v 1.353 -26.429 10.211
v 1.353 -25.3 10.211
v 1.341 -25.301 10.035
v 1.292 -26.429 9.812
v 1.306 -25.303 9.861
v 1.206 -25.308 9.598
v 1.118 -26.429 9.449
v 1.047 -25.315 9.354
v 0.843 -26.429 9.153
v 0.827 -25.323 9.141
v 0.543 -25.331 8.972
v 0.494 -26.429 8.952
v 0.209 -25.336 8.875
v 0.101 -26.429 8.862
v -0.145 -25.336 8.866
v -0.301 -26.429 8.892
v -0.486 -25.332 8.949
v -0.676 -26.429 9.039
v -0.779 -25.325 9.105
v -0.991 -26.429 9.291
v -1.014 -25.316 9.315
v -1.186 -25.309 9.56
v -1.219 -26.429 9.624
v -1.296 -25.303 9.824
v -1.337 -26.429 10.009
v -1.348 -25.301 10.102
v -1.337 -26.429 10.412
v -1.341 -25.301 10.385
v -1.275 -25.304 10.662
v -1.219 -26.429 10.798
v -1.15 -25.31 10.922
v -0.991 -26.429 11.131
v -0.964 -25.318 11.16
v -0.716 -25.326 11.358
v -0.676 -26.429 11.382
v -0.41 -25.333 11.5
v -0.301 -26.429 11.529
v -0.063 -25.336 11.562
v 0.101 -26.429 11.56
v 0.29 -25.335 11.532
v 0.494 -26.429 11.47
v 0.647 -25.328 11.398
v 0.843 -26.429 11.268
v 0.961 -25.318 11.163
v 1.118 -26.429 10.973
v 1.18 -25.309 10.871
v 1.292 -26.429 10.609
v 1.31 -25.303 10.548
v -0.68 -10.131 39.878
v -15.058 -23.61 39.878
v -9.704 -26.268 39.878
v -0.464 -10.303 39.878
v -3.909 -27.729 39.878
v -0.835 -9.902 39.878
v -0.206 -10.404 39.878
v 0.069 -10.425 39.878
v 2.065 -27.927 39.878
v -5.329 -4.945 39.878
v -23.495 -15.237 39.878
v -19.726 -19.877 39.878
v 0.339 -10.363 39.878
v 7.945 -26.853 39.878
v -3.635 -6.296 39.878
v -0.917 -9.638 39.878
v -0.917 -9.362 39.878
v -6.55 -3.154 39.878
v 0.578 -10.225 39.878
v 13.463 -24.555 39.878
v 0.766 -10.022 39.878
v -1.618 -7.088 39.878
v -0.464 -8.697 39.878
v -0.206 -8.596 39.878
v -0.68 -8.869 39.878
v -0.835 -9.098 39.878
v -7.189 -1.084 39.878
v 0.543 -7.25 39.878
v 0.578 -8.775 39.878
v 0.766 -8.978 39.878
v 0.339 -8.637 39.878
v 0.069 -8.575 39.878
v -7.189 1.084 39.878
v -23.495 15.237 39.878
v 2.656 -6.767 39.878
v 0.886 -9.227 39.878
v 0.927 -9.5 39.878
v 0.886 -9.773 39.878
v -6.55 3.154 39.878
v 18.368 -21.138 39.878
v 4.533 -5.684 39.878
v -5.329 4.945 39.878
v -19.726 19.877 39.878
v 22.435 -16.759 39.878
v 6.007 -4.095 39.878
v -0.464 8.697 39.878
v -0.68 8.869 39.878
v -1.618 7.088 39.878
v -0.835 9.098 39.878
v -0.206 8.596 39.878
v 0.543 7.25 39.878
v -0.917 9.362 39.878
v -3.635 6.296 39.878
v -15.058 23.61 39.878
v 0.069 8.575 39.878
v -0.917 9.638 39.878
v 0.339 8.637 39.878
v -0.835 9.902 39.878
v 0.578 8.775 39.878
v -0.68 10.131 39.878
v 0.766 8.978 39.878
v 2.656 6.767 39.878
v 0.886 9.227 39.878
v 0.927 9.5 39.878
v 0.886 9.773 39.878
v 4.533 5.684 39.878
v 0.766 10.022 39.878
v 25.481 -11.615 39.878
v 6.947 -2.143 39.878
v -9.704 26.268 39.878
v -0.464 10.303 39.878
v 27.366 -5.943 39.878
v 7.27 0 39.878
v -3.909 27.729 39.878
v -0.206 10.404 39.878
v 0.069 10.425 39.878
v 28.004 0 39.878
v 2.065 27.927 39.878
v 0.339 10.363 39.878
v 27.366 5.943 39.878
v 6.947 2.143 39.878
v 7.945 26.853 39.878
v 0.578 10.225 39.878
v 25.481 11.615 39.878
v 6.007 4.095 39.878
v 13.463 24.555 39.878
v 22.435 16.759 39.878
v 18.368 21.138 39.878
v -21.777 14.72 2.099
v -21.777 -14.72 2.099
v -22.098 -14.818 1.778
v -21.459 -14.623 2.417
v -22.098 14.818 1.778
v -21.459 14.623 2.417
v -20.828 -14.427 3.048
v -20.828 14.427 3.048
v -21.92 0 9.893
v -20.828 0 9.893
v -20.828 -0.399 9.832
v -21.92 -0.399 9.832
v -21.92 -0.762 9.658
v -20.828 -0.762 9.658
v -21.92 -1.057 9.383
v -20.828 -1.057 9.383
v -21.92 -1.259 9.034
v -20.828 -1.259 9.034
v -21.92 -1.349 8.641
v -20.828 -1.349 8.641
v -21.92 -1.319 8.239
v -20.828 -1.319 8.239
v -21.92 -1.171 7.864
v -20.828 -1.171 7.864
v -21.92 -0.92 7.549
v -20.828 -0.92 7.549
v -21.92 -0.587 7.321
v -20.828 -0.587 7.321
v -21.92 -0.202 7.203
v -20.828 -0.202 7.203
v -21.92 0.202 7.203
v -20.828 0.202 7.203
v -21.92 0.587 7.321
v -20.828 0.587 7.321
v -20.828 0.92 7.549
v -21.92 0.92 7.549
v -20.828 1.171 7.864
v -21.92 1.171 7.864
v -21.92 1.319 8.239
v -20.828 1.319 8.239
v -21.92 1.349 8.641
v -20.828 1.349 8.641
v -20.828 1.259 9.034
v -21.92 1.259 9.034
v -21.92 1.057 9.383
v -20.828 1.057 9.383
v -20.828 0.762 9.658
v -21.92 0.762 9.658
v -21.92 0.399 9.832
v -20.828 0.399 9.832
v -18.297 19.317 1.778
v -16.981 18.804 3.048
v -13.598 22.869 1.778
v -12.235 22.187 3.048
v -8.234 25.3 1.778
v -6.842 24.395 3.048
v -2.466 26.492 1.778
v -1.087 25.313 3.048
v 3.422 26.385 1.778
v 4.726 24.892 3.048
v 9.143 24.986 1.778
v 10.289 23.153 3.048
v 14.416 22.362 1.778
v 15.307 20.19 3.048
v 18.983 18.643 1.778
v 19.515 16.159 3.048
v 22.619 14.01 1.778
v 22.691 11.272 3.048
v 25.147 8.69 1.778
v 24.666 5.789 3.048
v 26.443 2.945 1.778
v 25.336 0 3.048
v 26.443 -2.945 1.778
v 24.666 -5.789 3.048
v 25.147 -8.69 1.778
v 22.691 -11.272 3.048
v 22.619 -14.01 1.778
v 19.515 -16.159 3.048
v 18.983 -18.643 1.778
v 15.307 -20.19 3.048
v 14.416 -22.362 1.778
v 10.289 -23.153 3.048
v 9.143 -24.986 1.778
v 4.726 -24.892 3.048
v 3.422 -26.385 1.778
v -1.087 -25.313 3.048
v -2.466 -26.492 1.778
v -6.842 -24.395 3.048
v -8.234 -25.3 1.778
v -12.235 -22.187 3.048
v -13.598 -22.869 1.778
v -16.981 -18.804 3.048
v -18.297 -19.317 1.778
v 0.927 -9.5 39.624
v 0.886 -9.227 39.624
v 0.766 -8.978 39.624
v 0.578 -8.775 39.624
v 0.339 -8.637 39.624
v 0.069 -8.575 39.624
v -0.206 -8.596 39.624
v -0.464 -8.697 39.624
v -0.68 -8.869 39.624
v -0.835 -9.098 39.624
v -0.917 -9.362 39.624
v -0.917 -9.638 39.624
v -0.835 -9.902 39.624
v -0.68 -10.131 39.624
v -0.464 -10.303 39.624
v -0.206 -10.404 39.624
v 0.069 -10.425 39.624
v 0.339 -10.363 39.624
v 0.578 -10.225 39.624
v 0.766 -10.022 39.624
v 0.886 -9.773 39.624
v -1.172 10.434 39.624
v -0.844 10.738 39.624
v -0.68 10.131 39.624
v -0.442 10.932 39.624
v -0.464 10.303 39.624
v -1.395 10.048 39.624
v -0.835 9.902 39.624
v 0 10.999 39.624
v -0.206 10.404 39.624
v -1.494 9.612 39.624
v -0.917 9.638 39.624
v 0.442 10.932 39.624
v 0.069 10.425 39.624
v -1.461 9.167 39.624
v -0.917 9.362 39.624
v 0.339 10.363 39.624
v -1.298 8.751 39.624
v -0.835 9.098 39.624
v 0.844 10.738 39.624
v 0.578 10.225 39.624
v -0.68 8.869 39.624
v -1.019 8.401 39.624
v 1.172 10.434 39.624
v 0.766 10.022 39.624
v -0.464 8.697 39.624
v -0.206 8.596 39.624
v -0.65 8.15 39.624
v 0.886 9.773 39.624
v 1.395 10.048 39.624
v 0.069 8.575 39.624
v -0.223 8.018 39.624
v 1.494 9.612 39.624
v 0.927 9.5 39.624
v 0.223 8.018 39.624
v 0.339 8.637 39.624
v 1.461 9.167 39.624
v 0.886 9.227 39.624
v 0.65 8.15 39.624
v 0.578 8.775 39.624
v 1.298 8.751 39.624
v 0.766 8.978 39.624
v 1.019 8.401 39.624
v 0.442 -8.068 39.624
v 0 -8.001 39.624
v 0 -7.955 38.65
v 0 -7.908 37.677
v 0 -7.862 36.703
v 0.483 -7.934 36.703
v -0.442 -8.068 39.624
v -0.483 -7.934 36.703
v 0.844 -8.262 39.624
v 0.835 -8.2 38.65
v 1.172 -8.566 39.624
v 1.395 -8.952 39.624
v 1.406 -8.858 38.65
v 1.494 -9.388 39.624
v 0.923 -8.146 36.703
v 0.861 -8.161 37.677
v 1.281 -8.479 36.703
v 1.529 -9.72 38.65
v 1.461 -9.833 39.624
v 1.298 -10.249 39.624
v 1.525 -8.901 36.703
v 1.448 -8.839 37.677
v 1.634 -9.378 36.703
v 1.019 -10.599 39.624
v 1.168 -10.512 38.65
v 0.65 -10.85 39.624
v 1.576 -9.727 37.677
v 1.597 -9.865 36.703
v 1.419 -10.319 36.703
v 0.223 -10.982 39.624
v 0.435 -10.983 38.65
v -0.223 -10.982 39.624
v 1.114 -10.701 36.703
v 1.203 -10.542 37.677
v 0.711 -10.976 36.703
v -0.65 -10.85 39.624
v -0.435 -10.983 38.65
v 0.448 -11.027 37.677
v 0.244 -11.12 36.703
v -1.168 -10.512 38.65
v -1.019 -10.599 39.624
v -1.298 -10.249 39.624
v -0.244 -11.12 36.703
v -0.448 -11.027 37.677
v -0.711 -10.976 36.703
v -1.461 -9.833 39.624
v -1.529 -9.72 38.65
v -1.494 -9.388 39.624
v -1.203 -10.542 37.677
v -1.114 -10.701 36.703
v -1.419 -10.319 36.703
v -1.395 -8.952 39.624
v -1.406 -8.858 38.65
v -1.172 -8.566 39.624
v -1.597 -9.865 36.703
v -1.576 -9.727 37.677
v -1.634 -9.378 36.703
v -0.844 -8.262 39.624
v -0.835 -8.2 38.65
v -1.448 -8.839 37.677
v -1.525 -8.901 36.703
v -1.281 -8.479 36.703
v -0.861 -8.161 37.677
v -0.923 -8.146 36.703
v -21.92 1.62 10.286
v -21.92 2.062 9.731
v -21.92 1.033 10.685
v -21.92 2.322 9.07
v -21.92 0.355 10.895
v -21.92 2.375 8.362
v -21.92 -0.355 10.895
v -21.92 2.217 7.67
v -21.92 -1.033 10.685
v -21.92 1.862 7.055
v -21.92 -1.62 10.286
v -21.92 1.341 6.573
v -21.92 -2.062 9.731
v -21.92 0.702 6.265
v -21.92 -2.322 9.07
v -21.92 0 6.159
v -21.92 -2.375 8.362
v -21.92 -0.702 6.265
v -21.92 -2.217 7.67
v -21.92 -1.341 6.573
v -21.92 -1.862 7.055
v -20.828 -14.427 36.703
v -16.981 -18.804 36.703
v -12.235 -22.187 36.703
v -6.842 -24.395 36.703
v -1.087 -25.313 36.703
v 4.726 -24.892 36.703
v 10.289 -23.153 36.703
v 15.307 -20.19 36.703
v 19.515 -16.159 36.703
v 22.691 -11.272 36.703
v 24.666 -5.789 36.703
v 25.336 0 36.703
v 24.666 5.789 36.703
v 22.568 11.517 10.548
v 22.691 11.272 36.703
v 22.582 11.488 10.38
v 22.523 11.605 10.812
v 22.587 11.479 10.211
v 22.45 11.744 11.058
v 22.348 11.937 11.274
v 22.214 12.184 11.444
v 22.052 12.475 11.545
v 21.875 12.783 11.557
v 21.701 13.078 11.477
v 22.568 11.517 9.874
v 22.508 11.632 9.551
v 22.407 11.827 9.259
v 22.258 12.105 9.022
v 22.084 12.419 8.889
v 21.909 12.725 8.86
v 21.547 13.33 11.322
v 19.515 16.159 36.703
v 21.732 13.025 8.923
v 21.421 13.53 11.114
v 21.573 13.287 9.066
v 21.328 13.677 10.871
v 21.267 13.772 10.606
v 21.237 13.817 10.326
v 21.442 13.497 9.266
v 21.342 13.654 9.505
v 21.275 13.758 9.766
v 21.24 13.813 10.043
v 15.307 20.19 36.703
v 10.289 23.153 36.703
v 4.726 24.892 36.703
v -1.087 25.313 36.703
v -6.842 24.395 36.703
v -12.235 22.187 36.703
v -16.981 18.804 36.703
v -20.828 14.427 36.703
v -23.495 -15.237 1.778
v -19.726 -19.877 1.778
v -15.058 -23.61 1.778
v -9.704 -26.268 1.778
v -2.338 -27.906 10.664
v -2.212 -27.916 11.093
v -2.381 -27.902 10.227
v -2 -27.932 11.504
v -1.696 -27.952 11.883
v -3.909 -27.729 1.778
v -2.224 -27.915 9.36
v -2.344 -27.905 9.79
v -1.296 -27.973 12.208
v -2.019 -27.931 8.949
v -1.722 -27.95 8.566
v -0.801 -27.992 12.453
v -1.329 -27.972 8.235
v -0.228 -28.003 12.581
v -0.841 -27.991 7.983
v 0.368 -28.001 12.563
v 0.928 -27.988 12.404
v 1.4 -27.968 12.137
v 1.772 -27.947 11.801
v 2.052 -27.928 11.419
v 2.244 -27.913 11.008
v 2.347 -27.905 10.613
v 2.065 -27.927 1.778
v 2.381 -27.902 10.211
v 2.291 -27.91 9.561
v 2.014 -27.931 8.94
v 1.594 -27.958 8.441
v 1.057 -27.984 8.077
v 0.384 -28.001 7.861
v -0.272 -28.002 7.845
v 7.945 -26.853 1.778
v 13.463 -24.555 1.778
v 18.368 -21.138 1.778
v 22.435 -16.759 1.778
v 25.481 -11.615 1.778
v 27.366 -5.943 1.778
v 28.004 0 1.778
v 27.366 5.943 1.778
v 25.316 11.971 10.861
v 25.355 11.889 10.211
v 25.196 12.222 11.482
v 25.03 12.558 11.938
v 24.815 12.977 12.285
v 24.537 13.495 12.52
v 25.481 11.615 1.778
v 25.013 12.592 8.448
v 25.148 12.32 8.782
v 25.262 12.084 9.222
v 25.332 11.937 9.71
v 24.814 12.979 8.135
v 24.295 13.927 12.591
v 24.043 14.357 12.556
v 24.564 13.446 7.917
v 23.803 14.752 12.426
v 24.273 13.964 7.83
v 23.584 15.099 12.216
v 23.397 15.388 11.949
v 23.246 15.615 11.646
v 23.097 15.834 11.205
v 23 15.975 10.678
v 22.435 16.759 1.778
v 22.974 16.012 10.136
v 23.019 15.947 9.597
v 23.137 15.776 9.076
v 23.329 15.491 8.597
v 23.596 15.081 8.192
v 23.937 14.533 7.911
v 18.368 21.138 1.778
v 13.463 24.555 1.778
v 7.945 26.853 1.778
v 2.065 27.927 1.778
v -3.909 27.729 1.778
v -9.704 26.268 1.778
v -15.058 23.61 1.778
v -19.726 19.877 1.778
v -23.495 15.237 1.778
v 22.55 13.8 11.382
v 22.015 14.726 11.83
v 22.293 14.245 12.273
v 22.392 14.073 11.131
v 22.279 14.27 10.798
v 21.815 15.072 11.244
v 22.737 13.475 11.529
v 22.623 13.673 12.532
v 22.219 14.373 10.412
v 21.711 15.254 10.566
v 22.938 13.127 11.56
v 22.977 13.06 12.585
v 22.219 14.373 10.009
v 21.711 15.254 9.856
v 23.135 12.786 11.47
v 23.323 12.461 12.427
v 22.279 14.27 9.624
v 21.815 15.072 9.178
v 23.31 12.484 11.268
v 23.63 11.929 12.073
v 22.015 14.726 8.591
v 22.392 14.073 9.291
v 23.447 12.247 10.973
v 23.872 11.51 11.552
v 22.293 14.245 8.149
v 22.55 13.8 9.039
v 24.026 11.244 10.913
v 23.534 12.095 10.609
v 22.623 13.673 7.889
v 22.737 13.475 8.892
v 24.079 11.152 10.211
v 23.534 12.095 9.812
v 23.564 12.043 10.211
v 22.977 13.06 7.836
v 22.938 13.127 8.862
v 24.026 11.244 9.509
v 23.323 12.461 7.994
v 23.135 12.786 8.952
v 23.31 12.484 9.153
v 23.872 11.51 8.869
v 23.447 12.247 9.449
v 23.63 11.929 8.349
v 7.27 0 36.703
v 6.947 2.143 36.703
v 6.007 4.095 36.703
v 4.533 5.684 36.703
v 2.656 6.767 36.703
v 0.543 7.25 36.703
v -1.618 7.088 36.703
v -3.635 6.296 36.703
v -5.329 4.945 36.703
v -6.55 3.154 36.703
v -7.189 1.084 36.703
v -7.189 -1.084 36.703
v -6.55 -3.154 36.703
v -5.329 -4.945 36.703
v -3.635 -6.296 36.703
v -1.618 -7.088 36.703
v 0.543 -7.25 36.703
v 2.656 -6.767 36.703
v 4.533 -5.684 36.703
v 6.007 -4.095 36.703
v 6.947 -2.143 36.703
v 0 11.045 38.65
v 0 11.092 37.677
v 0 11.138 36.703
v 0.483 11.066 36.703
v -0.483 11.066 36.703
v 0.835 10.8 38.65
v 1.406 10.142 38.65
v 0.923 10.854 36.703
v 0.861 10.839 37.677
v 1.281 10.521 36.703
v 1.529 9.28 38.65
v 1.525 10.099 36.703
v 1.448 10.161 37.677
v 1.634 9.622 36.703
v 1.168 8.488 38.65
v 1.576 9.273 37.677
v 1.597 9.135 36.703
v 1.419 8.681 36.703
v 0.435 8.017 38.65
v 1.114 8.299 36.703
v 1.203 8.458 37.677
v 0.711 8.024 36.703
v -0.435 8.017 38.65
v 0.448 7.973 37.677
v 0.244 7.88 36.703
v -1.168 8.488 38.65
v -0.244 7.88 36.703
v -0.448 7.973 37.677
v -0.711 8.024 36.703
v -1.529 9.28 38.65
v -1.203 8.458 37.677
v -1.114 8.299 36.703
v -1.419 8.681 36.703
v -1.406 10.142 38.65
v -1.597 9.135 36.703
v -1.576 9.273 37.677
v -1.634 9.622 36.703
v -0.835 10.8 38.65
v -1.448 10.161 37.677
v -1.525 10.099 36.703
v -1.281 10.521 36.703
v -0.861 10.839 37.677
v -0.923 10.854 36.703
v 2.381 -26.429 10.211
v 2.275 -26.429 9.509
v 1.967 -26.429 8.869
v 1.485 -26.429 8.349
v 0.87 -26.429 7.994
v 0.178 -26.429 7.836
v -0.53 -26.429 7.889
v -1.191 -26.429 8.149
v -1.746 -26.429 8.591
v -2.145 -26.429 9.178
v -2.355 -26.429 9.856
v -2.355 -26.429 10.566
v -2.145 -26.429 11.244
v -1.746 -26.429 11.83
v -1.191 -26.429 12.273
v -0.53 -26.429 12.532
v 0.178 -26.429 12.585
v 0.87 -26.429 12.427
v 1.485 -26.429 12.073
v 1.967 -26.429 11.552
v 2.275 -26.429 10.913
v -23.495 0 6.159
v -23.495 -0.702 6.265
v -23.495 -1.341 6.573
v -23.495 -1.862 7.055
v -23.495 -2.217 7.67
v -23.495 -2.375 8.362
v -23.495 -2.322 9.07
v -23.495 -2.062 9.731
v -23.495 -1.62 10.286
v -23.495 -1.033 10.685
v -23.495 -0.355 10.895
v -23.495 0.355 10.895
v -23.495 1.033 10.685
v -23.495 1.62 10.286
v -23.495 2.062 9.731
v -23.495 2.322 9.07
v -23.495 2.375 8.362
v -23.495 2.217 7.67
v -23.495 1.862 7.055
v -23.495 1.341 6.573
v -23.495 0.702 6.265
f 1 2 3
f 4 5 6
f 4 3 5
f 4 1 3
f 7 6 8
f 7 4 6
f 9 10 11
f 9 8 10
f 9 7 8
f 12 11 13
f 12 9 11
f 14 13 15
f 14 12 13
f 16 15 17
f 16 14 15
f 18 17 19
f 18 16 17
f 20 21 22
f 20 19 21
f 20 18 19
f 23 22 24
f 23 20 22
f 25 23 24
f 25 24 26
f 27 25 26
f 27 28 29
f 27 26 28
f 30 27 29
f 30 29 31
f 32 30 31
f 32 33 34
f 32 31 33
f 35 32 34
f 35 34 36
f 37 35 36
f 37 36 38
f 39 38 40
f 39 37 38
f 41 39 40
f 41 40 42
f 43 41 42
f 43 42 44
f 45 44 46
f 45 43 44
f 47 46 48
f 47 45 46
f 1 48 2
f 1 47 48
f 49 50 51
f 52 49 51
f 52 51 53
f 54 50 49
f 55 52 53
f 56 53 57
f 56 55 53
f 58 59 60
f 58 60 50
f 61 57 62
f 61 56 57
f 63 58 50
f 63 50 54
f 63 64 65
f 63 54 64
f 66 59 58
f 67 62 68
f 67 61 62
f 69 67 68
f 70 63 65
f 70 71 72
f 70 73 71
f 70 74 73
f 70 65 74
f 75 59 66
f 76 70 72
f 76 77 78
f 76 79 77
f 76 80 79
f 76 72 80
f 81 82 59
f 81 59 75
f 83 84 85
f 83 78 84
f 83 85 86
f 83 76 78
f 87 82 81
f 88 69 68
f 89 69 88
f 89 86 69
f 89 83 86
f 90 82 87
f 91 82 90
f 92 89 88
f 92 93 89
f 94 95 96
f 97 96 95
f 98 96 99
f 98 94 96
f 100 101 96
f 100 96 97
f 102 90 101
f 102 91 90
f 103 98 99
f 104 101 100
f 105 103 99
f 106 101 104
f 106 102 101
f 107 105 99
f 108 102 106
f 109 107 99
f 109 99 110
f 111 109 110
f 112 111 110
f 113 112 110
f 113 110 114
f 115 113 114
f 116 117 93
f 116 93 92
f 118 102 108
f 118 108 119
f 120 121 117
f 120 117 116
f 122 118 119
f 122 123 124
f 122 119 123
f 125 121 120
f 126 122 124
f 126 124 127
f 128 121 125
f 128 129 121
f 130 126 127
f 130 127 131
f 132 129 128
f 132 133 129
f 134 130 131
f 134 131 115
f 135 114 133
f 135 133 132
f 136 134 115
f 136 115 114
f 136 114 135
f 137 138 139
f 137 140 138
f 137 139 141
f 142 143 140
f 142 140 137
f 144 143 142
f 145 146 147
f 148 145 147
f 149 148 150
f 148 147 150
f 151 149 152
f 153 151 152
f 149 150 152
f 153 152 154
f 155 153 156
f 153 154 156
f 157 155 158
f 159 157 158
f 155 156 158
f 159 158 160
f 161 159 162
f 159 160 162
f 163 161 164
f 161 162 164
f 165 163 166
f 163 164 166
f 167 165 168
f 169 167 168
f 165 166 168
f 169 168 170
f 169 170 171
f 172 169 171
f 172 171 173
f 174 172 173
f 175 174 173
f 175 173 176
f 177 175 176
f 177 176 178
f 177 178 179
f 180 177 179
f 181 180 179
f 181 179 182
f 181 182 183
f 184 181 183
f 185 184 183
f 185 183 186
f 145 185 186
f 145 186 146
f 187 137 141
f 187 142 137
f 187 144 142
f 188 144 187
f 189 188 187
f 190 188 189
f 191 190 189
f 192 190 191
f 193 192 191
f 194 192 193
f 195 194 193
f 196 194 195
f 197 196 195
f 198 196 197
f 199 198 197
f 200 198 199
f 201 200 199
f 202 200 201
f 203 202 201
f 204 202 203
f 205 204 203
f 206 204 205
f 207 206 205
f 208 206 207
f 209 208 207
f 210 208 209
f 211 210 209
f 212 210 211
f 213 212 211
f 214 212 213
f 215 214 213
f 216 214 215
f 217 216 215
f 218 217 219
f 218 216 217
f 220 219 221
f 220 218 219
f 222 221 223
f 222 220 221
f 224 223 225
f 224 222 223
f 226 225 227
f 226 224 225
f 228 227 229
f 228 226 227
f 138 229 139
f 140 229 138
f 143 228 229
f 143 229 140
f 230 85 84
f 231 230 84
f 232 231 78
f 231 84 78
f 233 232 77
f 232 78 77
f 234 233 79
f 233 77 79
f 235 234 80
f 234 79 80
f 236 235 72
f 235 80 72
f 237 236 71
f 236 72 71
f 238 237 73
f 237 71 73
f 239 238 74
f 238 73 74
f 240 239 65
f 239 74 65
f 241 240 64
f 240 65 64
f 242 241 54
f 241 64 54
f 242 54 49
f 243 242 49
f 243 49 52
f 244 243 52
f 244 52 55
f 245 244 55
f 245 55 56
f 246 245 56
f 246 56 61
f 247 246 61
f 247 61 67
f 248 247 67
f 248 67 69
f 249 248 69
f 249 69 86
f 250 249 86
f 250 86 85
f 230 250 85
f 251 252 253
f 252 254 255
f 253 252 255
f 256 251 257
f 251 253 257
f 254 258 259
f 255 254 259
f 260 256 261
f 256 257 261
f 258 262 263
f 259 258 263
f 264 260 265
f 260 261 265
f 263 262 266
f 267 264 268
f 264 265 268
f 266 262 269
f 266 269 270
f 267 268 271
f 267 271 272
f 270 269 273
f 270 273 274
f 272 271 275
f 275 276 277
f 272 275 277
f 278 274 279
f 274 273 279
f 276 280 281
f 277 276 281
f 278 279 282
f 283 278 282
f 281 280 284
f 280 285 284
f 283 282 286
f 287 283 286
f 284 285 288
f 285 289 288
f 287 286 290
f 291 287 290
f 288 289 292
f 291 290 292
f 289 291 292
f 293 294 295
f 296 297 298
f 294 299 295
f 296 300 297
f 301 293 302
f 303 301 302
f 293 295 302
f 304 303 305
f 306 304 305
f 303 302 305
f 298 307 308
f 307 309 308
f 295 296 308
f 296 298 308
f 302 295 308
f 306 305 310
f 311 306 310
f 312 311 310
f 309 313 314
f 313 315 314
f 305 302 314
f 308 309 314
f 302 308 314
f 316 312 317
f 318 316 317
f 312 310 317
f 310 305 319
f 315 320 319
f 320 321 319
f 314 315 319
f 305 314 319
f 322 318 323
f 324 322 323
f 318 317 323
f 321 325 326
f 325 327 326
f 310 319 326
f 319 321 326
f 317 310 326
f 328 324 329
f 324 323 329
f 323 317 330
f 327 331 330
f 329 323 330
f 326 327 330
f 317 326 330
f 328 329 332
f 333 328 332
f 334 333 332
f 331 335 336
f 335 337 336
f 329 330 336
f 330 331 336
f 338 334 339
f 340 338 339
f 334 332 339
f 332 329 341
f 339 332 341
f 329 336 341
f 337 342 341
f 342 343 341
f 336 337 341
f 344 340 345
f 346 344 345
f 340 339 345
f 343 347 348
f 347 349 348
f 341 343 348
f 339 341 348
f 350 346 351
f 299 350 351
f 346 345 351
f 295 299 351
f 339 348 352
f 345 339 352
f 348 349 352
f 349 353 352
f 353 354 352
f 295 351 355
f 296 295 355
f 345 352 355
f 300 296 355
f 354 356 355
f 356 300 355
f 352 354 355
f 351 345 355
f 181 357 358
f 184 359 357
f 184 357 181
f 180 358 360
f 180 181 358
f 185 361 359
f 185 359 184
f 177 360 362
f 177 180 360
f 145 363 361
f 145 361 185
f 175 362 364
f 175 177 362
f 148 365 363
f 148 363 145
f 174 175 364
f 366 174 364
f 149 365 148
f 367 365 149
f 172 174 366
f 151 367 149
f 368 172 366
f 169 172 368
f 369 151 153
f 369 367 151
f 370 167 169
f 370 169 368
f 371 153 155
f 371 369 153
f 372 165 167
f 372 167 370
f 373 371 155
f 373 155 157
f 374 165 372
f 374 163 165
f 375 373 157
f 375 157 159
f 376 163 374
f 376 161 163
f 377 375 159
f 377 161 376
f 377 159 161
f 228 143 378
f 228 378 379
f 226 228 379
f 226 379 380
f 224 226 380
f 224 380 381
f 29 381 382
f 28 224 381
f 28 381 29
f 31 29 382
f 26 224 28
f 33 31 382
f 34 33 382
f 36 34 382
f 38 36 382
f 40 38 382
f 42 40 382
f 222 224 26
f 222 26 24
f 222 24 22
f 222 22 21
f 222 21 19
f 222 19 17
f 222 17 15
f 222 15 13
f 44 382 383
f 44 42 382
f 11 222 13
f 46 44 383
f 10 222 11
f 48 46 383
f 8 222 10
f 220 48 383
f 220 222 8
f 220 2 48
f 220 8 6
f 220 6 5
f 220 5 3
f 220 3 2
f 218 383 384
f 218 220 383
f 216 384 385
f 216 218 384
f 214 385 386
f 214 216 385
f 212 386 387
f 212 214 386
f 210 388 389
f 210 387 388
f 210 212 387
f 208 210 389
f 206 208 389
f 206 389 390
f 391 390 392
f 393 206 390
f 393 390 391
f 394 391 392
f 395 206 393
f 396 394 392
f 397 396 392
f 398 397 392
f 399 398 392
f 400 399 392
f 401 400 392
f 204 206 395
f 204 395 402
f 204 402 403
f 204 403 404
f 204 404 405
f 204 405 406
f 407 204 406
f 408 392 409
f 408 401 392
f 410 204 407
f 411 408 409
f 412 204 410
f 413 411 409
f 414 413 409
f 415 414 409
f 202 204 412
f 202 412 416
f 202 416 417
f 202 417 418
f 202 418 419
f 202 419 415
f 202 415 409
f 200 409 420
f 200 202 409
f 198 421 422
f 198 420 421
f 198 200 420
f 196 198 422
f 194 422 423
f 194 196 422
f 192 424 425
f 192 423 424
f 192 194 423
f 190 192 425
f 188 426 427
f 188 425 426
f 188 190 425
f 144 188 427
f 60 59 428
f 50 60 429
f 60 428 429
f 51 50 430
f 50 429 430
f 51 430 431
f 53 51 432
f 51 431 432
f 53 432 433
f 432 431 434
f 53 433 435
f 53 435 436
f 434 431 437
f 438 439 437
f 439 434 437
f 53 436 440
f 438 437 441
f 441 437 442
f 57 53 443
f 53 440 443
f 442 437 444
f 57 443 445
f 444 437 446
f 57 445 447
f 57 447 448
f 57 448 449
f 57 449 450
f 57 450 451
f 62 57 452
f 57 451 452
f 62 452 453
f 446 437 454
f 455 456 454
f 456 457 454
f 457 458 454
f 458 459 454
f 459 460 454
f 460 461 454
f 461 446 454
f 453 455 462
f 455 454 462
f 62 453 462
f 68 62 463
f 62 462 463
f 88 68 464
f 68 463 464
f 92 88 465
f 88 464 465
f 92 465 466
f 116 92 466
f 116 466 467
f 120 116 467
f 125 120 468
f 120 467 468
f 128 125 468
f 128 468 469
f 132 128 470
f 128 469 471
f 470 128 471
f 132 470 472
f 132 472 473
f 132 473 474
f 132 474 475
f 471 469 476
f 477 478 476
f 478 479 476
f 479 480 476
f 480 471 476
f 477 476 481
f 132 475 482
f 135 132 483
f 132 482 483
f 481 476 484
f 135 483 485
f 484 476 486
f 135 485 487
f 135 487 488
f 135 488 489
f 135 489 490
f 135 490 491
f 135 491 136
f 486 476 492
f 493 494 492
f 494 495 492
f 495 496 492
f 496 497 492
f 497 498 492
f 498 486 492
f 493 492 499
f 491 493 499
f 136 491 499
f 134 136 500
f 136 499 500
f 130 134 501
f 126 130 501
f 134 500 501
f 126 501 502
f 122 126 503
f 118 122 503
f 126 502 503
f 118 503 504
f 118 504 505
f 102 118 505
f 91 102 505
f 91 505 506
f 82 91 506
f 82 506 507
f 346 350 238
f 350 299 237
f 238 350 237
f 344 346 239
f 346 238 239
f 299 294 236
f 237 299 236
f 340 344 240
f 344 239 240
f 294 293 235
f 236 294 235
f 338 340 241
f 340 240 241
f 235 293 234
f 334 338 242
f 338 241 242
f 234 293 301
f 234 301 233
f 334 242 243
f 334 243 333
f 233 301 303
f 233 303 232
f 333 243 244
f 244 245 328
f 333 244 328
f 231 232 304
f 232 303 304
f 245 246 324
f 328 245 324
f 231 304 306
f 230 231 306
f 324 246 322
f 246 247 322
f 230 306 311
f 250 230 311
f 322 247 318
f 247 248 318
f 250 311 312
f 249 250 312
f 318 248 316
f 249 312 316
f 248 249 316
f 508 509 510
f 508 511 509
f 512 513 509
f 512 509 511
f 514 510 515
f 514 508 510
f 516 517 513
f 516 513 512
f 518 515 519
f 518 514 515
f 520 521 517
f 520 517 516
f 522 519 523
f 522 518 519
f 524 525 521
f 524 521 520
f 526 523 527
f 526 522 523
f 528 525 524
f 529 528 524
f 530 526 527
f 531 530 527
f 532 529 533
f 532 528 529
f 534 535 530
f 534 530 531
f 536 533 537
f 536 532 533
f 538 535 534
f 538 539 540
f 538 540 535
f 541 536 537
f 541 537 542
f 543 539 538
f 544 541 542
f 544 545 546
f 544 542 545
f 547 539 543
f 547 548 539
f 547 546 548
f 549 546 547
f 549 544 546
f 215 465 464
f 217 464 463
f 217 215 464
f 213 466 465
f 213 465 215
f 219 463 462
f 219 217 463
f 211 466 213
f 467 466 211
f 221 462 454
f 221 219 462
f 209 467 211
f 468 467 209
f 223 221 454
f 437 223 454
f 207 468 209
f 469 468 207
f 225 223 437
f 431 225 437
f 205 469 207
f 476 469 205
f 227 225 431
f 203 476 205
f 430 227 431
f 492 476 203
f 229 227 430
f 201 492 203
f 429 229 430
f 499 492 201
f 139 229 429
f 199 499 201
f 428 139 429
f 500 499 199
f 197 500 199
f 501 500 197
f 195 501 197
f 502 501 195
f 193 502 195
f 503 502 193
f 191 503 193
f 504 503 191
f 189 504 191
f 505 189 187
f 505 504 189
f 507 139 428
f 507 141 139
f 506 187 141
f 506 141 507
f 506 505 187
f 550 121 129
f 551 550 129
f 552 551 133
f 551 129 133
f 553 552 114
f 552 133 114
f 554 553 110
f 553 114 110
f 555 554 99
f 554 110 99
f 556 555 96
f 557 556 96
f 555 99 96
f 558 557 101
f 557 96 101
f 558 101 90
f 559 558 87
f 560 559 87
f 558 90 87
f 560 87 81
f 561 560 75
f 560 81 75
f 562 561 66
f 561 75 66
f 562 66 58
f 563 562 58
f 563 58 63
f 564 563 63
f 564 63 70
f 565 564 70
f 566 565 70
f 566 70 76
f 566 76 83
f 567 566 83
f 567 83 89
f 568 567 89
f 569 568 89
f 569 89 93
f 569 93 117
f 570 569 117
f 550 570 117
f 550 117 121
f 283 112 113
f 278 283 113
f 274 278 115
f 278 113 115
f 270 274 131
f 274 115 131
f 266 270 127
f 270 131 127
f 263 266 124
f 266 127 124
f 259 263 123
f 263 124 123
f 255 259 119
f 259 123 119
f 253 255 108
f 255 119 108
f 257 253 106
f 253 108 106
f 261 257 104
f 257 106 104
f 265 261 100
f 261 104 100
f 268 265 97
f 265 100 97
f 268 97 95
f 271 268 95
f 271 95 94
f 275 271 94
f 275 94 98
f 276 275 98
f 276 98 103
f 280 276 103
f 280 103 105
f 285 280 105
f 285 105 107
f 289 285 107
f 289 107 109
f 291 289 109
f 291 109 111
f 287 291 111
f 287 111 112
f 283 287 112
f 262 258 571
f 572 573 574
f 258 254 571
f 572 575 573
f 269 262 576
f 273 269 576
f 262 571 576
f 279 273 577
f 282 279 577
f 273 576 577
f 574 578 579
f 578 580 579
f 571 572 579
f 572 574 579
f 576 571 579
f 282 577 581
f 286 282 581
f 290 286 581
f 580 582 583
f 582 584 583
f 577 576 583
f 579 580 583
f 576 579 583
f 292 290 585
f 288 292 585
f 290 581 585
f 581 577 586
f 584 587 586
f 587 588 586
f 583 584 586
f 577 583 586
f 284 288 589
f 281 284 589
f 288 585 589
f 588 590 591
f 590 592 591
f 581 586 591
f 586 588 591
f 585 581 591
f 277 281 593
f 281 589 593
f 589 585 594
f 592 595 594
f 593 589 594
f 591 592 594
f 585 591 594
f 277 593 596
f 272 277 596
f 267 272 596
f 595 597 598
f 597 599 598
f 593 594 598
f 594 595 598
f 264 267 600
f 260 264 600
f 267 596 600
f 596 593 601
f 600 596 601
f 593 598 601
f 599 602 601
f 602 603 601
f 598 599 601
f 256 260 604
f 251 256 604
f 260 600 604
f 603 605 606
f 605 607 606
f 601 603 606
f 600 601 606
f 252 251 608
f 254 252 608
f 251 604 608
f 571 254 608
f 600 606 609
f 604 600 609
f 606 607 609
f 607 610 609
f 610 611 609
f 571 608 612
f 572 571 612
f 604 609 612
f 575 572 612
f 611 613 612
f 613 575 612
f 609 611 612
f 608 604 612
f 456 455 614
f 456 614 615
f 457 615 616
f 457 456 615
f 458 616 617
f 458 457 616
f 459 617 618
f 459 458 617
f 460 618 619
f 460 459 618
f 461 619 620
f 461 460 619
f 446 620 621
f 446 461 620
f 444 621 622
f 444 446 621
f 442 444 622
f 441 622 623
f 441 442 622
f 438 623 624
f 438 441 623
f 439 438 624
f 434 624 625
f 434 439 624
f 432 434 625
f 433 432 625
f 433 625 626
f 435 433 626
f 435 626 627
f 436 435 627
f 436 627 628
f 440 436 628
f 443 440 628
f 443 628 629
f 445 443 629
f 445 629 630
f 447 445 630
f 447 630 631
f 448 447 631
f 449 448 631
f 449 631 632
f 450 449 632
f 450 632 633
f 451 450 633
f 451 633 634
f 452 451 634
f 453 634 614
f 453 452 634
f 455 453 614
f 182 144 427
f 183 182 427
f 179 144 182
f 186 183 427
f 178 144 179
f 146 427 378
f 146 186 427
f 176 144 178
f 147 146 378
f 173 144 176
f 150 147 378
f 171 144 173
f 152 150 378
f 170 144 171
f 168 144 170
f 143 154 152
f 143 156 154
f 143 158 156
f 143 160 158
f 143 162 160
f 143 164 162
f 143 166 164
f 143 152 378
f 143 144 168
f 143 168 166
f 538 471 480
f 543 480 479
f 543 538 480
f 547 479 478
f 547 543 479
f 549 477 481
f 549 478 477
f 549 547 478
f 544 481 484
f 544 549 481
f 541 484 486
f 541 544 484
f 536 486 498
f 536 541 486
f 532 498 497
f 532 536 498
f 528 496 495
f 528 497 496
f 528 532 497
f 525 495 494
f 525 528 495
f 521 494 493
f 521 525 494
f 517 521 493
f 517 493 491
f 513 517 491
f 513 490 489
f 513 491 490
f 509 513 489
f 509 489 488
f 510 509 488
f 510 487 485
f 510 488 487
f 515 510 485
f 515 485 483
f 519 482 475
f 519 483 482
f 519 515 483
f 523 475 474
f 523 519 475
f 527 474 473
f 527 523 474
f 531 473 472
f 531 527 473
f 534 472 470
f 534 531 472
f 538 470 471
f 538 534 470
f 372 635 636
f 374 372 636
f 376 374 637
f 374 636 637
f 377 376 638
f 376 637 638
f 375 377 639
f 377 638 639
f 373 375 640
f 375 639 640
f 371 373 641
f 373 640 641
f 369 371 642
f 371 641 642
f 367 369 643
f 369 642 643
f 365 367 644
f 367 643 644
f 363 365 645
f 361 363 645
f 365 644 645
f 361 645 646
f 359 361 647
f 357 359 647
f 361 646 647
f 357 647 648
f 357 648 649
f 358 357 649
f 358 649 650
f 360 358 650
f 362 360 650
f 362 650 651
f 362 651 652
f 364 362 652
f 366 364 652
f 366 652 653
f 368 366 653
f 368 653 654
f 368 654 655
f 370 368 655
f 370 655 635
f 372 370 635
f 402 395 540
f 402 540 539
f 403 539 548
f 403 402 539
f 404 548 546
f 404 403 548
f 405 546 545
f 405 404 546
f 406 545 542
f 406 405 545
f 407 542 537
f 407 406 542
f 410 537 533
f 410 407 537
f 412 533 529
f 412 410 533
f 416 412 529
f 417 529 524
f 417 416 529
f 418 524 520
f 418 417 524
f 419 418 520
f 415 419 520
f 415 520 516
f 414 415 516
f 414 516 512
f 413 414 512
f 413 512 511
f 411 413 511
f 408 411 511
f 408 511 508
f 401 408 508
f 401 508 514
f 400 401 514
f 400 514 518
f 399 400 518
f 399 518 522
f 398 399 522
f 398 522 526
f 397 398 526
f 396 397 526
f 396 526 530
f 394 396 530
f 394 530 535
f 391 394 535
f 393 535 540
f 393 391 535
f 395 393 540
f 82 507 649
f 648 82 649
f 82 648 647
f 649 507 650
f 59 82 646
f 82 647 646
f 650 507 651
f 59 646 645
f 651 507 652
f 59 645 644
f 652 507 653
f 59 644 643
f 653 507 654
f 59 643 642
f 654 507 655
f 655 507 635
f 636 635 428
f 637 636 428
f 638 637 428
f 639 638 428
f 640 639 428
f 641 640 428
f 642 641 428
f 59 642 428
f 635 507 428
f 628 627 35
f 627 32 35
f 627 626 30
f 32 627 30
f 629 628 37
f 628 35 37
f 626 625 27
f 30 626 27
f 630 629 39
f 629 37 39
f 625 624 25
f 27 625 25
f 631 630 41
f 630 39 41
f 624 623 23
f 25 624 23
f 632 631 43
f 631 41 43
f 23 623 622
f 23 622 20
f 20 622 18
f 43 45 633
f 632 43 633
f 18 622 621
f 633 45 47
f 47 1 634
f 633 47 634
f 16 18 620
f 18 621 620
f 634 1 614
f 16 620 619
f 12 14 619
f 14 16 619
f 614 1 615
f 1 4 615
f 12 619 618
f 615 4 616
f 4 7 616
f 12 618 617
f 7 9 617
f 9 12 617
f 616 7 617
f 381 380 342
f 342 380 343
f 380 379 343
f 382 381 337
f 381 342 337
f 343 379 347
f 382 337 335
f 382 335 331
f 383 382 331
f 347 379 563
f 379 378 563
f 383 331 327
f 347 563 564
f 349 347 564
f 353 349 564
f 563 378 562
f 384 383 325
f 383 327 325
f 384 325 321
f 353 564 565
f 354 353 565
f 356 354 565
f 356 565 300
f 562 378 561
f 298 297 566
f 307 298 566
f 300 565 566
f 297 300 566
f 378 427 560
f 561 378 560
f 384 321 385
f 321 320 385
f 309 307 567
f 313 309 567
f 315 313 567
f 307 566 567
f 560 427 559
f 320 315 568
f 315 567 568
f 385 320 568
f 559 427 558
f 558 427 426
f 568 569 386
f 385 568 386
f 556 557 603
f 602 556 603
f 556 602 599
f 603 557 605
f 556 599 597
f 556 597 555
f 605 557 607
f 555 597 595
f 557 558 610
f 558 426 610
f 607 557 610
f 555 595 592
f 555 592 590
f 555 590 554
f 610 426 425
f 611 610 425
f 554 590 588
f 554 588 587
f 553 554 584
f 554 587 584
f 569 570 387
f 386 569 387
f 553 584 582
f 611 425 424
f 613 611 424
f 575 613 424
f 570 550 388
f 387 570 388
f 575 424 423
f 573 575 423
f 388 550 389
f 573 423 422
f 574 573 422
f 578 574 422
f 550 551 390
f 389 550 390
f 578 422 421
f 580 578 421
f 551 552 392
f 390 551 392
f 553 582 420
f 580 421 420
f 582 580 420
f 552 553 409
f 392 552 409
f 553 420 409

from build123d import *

# Parameters (mm, degrees)
BOSS_EXTRUDE1_DEPTH                             = 39.878
BOSS_EXTRUDE2_START                             = -3.175
BOSS_EXTRUDE2_DEPTH                             = 3.175
CBORE_FOR_2_PAN_HEAD_MACHINE_SCREW1_D           = 2.7051
CBORE_FOR_2_PAN_HEAD_MACHINE_SCREW1_DEPTH       = 2.667
CBORE_FOR_2_PAN_HEAD_MACHINE_SCREW1_CBORE_D     = 4.7625
CBORE_FOR_2_PAN_HEAD_MACHINE_SCREW1_CBORE_DEPTH = 1.5748
CBORE_START                                     = 26.4287
CBORE_FOR_2_PAN_HEAD_MACHINE_SCREW2_OUT_R       = 2.38125
CBORE_FOR_2_PAN_HEAD_MACHINE_SCREW2_DEPTH       = 1.574800075
CBORE_START_2                                   = 25.300372244
CBORE_FOR_2_PAN_HEAD_MACHINE_SCREW2_2_O_R       = 1.35255
CBORE_FOR_2_PAN_HEAD_MACHINE_SCREW2_2_DEPTH     = 1.128327756
CBORE_START_3                                   = -28.003500101
CBORE_FOR_2_PAN_HEAD_MACHINE_SCREW3_OUT_R       = 2.38125
CBORE_FOR_2_PAN_HEAD_MACHINE_SCREW3_DEPTH       = 1.574800101
CBORE_START_4                                   = -26.4287
CBORE_FOR_2_PAN_HEAD_MACHINE_SCREW3_2_O_R       = 1.35255
CBORE_FOR_2_PAN_HEAD_MACHINE_SCREW3_2_DEPTH     = 1.128327733
CUT_EXTRUDE1_REACH                              = 58.202
SKETCH20_R                                      = 7.27
HOLE1_AT_2_COUNT                                = 2
HOLE1_AT_2_PITCH                                = 19
F_0_CLEARANCE_HOLE1_D                           = 1.8542
CUT_EXTRUDE2_DEPTH                              = 1.778
CHAMFER1_SIZE                                   = 1.27


# Read off the part's stored shape, not the designer's step: CBORE for #2 Pan Head Machine Screw2, CBORE for #2 Pan Head Machine Screw3
with BuildPart() as part:
    # Sketch1 → Boss-Extrude1 (new body)
    with BuildSketch(Plane.XY):
        with BuildLine():
            Line((-23.495, 15.237486251), (-23.495, -15.237486251))
            ThreePointArc((-23.495, -15.237486251), (28.0035, 0), (-23.495, 15.237486251))
        make_face()
        with BuildLine():
            Line((-20.828, 14.42680312), (-20.828, -14.42680312))
            ThreePointArc((-20.828, -14.42680312), (25.3365, 0), (-20.828, 14.42680312))
        make_face(mode=Mode.SUBTRACT)
    extrude(amount=BOSS_EXTRUDE1_DEPTH)

    # Sketch10 → Boss-Extrude2 (add)
    with BuildSketch(Plane.XY.offset(39.878).offset(BOSS_EXTRUDE2_START)):
        with BuildLine():
            Line((-23.495, 15.237486251), (-23.495, -15.237486251))
            ThreePointArc((-23.495, -15.237486251), (28.0035, 0), (-23.495, 15.237486251))
        make_face()
    extrude(amount=BOSS_EXTRUDE2_DEPTH)

    # CBORE for #2 Pan Head Machine Screw1
    with Locations(Plane(origin=(-23.495, 13.798981486, 10.2108), x_dir=(0, 0, -1), z_dir=(-1, 0, 0))):
        with Locations((1.6708, 13.798981486)):
            CounterBoreHole(CBORE_FOR_2_PAN_HEAD_MACHINE_SCREW1_D / 2, CBORE_FOR_2_PAN_HEAD_MACHINE_SCREW1_CBORE_D / 2, CBORE_FOR_2_PAN_HEAD_MACHINE_SCREW1_CBORE_DEPTH, depth=CBORE_FOR_2_PAN_HEAD_MACHINE_SCREW1_DEPTH)

    # CBORE for #2 Pan Head Machine Screw2 out → CBORE for #2 Pan Head Machine Screw2 (cut)
    with BuildSketch(Plane(origin=(0, 0, 0), x_dir=(0.500000000000004, -0.8660254037844363, 0), z_dir=(0.8660254037844363, 0.5000000000000042, 0)).offset(CBORE_START)):
        with Locations((0, -10.2108)):
            Circle(CBORE_FOR_2_PAN_HEAD_MACHINE_SCREW2_OUT_R)
    extrude(amount=CBORE_FOR_2_PAN_HEAD_MACHINE_SCREW2_DEPTH, mode=Mode.SUBTRACT)

    # CBORE for _2 Pan Head Machine Screw2 2 o → CBORE for _2 Pan Head Machine Screw2 2 (cut)
    with BuildSketch(Plane(origin=(0, 0, 0), x_dir=(0.500000000000004, -0.8660254037844363, 0), z_dir=(0.8660254037844363, 0.5000000000000042, 0)).offset(CBORE_START_2)):
        with Locations((0, -10.2108)):
            Circle(CBORE_FOR_2_PAN_HEAD_MACHINE_SCREW2_2_O_R)
    extrude(amount=CBORE_FOR_2_PAN_HEAD_MACHINE_SCREW2_2_DEPTH, mode=Mode.SUBTRACT)

    # CBORE for #2 Pan Head Machine Screw3 out → CBORE for #2 Pan Head Machine Screw3 (cut)
    with BuildSketch(Plane(origin=(0, 0, 0), x_dir=(1, 0, 0), z_dir=(0, 1, 0)).offset(CBORE_START_3)):
        with Locations((0, -10.2108)):
            Circle(CBORE_FOR_2_PAN_HEAD_MACHINE_SCREW3_OUT_R)
    extrude(amount=CBORE_FOR_2_PAN_HEAD_MACHINE_SCREW3_DEPTH, mode=Mode.SUBTRACT)

    # CBORE for _2 Pan Head Machine Screw3 2 o → CBORE for _2 Pan Head Machine Screw3 2 (cut)
    with BuildSketch(Plane(origin=(0, 0, 0), x_dir=(1, 0, 0), z_dir=(0, 1, 0)).offset(CBORE_START_4)):
        with Locations((0, -10.2108)):
            Circle(CBORE_FOR_2_PAN_HEAD_MACHINE_SCREW3_2_O_R)
    extrude(amount=CBORE_FOR_2_PAN_HEAD_MACHINE_SCREW3_2_DEPTH, mode=Mode.SUBTRACT)

    # Sketch20 → Cut-Extrude1 (cut, up to next)
    with BuildSketch(Plane.XY.offset(39.878), mode=Mode.PRIVATE) as cut_extrude1_sk1:
        Circle(SKETCH20_R)
    cut_extrude1_tool1 = extrude(cut_extrude1_sk1.sketch, amount=-CUT_EXTRUDE1_REACH, mode=Mode.PRIVATE) & part.part
    add(cut_extrude1_tool1.solids().sort_by_distance((0, 0, 39.878))[0], mode=Mode.SUBTRACT)

    # Sketch22 → Hole1 (revolve, cut)
    with BuildSketch(Plane(origin=(0, 9.5, 36.703), x_dir=(0, 1, 0), z_dir=(1, 0, 0))):
        Polygon((0, 0), (0, 2.921), (1.4986, 2.921), (1.6383, 0), align=None)
    hole1 = revolve(axis=Axis((0, 9.5, 146.703), (0, 0, -1)), mode=Mode.SUBTRACT)

    # Hole1 at 2: Hole1 ×2
    with Locations(*[(0, -i * HOLE1_AT_2_PITCH, 0) for i in range(1, HOLE1_AT_2_COUNT)]):
        add(hole1, mode=Mode.SUBTRACT)

    # #0 Clearance Hole1 (through all)
    with Locations(Plane(origin=(0, 0, 36.703), x_dir=(-1, 0, 0), z_dir=(0, 0, -1))):
        with Locations((0, 9.5), (0, -9.5)):
            Hole(F_0_CLEARANCE_HOLE1_D / 2)

    # Sketch25 → Cut-Extrude2 (cut)
    with BuildSketch(Plane(origin=(0, 0, 0), x_dir=(-1, 0, 0), z_dir=(0, 0, -1))):
        with BuildLine():
            Line((23.495, -15.237486251), (23.495, 15.237486251))
            ThreePointArc((23.495, 15.237486251), (-28.0035, 0), (23.495, -15.237486251))
        make_face()
        with BuildLine():
            Line((20.828, -14.42680312), (20.828, 14.42680312))
            ThreePointArc((20.828, 14.42680312), (-25.3365, 0), (20.828, -14.42680312))
        make_face(mode=Mode.SUBTRACT)
    extrude(amount=-CUT_EXTRUDE2_DEPTH, mode=Mode.SUBTRACT)

    # Chamfer1
    chamfer1_edges = [part.edges().sort_by_distance(p)[0] for p in [
        (-20.828, 0, 1.778),
        (25.3365, 0, 1.778),
    ]]
    chamfer(chamfer1_edges, length=CHAMFER1_SIZE)


solid = part.part
